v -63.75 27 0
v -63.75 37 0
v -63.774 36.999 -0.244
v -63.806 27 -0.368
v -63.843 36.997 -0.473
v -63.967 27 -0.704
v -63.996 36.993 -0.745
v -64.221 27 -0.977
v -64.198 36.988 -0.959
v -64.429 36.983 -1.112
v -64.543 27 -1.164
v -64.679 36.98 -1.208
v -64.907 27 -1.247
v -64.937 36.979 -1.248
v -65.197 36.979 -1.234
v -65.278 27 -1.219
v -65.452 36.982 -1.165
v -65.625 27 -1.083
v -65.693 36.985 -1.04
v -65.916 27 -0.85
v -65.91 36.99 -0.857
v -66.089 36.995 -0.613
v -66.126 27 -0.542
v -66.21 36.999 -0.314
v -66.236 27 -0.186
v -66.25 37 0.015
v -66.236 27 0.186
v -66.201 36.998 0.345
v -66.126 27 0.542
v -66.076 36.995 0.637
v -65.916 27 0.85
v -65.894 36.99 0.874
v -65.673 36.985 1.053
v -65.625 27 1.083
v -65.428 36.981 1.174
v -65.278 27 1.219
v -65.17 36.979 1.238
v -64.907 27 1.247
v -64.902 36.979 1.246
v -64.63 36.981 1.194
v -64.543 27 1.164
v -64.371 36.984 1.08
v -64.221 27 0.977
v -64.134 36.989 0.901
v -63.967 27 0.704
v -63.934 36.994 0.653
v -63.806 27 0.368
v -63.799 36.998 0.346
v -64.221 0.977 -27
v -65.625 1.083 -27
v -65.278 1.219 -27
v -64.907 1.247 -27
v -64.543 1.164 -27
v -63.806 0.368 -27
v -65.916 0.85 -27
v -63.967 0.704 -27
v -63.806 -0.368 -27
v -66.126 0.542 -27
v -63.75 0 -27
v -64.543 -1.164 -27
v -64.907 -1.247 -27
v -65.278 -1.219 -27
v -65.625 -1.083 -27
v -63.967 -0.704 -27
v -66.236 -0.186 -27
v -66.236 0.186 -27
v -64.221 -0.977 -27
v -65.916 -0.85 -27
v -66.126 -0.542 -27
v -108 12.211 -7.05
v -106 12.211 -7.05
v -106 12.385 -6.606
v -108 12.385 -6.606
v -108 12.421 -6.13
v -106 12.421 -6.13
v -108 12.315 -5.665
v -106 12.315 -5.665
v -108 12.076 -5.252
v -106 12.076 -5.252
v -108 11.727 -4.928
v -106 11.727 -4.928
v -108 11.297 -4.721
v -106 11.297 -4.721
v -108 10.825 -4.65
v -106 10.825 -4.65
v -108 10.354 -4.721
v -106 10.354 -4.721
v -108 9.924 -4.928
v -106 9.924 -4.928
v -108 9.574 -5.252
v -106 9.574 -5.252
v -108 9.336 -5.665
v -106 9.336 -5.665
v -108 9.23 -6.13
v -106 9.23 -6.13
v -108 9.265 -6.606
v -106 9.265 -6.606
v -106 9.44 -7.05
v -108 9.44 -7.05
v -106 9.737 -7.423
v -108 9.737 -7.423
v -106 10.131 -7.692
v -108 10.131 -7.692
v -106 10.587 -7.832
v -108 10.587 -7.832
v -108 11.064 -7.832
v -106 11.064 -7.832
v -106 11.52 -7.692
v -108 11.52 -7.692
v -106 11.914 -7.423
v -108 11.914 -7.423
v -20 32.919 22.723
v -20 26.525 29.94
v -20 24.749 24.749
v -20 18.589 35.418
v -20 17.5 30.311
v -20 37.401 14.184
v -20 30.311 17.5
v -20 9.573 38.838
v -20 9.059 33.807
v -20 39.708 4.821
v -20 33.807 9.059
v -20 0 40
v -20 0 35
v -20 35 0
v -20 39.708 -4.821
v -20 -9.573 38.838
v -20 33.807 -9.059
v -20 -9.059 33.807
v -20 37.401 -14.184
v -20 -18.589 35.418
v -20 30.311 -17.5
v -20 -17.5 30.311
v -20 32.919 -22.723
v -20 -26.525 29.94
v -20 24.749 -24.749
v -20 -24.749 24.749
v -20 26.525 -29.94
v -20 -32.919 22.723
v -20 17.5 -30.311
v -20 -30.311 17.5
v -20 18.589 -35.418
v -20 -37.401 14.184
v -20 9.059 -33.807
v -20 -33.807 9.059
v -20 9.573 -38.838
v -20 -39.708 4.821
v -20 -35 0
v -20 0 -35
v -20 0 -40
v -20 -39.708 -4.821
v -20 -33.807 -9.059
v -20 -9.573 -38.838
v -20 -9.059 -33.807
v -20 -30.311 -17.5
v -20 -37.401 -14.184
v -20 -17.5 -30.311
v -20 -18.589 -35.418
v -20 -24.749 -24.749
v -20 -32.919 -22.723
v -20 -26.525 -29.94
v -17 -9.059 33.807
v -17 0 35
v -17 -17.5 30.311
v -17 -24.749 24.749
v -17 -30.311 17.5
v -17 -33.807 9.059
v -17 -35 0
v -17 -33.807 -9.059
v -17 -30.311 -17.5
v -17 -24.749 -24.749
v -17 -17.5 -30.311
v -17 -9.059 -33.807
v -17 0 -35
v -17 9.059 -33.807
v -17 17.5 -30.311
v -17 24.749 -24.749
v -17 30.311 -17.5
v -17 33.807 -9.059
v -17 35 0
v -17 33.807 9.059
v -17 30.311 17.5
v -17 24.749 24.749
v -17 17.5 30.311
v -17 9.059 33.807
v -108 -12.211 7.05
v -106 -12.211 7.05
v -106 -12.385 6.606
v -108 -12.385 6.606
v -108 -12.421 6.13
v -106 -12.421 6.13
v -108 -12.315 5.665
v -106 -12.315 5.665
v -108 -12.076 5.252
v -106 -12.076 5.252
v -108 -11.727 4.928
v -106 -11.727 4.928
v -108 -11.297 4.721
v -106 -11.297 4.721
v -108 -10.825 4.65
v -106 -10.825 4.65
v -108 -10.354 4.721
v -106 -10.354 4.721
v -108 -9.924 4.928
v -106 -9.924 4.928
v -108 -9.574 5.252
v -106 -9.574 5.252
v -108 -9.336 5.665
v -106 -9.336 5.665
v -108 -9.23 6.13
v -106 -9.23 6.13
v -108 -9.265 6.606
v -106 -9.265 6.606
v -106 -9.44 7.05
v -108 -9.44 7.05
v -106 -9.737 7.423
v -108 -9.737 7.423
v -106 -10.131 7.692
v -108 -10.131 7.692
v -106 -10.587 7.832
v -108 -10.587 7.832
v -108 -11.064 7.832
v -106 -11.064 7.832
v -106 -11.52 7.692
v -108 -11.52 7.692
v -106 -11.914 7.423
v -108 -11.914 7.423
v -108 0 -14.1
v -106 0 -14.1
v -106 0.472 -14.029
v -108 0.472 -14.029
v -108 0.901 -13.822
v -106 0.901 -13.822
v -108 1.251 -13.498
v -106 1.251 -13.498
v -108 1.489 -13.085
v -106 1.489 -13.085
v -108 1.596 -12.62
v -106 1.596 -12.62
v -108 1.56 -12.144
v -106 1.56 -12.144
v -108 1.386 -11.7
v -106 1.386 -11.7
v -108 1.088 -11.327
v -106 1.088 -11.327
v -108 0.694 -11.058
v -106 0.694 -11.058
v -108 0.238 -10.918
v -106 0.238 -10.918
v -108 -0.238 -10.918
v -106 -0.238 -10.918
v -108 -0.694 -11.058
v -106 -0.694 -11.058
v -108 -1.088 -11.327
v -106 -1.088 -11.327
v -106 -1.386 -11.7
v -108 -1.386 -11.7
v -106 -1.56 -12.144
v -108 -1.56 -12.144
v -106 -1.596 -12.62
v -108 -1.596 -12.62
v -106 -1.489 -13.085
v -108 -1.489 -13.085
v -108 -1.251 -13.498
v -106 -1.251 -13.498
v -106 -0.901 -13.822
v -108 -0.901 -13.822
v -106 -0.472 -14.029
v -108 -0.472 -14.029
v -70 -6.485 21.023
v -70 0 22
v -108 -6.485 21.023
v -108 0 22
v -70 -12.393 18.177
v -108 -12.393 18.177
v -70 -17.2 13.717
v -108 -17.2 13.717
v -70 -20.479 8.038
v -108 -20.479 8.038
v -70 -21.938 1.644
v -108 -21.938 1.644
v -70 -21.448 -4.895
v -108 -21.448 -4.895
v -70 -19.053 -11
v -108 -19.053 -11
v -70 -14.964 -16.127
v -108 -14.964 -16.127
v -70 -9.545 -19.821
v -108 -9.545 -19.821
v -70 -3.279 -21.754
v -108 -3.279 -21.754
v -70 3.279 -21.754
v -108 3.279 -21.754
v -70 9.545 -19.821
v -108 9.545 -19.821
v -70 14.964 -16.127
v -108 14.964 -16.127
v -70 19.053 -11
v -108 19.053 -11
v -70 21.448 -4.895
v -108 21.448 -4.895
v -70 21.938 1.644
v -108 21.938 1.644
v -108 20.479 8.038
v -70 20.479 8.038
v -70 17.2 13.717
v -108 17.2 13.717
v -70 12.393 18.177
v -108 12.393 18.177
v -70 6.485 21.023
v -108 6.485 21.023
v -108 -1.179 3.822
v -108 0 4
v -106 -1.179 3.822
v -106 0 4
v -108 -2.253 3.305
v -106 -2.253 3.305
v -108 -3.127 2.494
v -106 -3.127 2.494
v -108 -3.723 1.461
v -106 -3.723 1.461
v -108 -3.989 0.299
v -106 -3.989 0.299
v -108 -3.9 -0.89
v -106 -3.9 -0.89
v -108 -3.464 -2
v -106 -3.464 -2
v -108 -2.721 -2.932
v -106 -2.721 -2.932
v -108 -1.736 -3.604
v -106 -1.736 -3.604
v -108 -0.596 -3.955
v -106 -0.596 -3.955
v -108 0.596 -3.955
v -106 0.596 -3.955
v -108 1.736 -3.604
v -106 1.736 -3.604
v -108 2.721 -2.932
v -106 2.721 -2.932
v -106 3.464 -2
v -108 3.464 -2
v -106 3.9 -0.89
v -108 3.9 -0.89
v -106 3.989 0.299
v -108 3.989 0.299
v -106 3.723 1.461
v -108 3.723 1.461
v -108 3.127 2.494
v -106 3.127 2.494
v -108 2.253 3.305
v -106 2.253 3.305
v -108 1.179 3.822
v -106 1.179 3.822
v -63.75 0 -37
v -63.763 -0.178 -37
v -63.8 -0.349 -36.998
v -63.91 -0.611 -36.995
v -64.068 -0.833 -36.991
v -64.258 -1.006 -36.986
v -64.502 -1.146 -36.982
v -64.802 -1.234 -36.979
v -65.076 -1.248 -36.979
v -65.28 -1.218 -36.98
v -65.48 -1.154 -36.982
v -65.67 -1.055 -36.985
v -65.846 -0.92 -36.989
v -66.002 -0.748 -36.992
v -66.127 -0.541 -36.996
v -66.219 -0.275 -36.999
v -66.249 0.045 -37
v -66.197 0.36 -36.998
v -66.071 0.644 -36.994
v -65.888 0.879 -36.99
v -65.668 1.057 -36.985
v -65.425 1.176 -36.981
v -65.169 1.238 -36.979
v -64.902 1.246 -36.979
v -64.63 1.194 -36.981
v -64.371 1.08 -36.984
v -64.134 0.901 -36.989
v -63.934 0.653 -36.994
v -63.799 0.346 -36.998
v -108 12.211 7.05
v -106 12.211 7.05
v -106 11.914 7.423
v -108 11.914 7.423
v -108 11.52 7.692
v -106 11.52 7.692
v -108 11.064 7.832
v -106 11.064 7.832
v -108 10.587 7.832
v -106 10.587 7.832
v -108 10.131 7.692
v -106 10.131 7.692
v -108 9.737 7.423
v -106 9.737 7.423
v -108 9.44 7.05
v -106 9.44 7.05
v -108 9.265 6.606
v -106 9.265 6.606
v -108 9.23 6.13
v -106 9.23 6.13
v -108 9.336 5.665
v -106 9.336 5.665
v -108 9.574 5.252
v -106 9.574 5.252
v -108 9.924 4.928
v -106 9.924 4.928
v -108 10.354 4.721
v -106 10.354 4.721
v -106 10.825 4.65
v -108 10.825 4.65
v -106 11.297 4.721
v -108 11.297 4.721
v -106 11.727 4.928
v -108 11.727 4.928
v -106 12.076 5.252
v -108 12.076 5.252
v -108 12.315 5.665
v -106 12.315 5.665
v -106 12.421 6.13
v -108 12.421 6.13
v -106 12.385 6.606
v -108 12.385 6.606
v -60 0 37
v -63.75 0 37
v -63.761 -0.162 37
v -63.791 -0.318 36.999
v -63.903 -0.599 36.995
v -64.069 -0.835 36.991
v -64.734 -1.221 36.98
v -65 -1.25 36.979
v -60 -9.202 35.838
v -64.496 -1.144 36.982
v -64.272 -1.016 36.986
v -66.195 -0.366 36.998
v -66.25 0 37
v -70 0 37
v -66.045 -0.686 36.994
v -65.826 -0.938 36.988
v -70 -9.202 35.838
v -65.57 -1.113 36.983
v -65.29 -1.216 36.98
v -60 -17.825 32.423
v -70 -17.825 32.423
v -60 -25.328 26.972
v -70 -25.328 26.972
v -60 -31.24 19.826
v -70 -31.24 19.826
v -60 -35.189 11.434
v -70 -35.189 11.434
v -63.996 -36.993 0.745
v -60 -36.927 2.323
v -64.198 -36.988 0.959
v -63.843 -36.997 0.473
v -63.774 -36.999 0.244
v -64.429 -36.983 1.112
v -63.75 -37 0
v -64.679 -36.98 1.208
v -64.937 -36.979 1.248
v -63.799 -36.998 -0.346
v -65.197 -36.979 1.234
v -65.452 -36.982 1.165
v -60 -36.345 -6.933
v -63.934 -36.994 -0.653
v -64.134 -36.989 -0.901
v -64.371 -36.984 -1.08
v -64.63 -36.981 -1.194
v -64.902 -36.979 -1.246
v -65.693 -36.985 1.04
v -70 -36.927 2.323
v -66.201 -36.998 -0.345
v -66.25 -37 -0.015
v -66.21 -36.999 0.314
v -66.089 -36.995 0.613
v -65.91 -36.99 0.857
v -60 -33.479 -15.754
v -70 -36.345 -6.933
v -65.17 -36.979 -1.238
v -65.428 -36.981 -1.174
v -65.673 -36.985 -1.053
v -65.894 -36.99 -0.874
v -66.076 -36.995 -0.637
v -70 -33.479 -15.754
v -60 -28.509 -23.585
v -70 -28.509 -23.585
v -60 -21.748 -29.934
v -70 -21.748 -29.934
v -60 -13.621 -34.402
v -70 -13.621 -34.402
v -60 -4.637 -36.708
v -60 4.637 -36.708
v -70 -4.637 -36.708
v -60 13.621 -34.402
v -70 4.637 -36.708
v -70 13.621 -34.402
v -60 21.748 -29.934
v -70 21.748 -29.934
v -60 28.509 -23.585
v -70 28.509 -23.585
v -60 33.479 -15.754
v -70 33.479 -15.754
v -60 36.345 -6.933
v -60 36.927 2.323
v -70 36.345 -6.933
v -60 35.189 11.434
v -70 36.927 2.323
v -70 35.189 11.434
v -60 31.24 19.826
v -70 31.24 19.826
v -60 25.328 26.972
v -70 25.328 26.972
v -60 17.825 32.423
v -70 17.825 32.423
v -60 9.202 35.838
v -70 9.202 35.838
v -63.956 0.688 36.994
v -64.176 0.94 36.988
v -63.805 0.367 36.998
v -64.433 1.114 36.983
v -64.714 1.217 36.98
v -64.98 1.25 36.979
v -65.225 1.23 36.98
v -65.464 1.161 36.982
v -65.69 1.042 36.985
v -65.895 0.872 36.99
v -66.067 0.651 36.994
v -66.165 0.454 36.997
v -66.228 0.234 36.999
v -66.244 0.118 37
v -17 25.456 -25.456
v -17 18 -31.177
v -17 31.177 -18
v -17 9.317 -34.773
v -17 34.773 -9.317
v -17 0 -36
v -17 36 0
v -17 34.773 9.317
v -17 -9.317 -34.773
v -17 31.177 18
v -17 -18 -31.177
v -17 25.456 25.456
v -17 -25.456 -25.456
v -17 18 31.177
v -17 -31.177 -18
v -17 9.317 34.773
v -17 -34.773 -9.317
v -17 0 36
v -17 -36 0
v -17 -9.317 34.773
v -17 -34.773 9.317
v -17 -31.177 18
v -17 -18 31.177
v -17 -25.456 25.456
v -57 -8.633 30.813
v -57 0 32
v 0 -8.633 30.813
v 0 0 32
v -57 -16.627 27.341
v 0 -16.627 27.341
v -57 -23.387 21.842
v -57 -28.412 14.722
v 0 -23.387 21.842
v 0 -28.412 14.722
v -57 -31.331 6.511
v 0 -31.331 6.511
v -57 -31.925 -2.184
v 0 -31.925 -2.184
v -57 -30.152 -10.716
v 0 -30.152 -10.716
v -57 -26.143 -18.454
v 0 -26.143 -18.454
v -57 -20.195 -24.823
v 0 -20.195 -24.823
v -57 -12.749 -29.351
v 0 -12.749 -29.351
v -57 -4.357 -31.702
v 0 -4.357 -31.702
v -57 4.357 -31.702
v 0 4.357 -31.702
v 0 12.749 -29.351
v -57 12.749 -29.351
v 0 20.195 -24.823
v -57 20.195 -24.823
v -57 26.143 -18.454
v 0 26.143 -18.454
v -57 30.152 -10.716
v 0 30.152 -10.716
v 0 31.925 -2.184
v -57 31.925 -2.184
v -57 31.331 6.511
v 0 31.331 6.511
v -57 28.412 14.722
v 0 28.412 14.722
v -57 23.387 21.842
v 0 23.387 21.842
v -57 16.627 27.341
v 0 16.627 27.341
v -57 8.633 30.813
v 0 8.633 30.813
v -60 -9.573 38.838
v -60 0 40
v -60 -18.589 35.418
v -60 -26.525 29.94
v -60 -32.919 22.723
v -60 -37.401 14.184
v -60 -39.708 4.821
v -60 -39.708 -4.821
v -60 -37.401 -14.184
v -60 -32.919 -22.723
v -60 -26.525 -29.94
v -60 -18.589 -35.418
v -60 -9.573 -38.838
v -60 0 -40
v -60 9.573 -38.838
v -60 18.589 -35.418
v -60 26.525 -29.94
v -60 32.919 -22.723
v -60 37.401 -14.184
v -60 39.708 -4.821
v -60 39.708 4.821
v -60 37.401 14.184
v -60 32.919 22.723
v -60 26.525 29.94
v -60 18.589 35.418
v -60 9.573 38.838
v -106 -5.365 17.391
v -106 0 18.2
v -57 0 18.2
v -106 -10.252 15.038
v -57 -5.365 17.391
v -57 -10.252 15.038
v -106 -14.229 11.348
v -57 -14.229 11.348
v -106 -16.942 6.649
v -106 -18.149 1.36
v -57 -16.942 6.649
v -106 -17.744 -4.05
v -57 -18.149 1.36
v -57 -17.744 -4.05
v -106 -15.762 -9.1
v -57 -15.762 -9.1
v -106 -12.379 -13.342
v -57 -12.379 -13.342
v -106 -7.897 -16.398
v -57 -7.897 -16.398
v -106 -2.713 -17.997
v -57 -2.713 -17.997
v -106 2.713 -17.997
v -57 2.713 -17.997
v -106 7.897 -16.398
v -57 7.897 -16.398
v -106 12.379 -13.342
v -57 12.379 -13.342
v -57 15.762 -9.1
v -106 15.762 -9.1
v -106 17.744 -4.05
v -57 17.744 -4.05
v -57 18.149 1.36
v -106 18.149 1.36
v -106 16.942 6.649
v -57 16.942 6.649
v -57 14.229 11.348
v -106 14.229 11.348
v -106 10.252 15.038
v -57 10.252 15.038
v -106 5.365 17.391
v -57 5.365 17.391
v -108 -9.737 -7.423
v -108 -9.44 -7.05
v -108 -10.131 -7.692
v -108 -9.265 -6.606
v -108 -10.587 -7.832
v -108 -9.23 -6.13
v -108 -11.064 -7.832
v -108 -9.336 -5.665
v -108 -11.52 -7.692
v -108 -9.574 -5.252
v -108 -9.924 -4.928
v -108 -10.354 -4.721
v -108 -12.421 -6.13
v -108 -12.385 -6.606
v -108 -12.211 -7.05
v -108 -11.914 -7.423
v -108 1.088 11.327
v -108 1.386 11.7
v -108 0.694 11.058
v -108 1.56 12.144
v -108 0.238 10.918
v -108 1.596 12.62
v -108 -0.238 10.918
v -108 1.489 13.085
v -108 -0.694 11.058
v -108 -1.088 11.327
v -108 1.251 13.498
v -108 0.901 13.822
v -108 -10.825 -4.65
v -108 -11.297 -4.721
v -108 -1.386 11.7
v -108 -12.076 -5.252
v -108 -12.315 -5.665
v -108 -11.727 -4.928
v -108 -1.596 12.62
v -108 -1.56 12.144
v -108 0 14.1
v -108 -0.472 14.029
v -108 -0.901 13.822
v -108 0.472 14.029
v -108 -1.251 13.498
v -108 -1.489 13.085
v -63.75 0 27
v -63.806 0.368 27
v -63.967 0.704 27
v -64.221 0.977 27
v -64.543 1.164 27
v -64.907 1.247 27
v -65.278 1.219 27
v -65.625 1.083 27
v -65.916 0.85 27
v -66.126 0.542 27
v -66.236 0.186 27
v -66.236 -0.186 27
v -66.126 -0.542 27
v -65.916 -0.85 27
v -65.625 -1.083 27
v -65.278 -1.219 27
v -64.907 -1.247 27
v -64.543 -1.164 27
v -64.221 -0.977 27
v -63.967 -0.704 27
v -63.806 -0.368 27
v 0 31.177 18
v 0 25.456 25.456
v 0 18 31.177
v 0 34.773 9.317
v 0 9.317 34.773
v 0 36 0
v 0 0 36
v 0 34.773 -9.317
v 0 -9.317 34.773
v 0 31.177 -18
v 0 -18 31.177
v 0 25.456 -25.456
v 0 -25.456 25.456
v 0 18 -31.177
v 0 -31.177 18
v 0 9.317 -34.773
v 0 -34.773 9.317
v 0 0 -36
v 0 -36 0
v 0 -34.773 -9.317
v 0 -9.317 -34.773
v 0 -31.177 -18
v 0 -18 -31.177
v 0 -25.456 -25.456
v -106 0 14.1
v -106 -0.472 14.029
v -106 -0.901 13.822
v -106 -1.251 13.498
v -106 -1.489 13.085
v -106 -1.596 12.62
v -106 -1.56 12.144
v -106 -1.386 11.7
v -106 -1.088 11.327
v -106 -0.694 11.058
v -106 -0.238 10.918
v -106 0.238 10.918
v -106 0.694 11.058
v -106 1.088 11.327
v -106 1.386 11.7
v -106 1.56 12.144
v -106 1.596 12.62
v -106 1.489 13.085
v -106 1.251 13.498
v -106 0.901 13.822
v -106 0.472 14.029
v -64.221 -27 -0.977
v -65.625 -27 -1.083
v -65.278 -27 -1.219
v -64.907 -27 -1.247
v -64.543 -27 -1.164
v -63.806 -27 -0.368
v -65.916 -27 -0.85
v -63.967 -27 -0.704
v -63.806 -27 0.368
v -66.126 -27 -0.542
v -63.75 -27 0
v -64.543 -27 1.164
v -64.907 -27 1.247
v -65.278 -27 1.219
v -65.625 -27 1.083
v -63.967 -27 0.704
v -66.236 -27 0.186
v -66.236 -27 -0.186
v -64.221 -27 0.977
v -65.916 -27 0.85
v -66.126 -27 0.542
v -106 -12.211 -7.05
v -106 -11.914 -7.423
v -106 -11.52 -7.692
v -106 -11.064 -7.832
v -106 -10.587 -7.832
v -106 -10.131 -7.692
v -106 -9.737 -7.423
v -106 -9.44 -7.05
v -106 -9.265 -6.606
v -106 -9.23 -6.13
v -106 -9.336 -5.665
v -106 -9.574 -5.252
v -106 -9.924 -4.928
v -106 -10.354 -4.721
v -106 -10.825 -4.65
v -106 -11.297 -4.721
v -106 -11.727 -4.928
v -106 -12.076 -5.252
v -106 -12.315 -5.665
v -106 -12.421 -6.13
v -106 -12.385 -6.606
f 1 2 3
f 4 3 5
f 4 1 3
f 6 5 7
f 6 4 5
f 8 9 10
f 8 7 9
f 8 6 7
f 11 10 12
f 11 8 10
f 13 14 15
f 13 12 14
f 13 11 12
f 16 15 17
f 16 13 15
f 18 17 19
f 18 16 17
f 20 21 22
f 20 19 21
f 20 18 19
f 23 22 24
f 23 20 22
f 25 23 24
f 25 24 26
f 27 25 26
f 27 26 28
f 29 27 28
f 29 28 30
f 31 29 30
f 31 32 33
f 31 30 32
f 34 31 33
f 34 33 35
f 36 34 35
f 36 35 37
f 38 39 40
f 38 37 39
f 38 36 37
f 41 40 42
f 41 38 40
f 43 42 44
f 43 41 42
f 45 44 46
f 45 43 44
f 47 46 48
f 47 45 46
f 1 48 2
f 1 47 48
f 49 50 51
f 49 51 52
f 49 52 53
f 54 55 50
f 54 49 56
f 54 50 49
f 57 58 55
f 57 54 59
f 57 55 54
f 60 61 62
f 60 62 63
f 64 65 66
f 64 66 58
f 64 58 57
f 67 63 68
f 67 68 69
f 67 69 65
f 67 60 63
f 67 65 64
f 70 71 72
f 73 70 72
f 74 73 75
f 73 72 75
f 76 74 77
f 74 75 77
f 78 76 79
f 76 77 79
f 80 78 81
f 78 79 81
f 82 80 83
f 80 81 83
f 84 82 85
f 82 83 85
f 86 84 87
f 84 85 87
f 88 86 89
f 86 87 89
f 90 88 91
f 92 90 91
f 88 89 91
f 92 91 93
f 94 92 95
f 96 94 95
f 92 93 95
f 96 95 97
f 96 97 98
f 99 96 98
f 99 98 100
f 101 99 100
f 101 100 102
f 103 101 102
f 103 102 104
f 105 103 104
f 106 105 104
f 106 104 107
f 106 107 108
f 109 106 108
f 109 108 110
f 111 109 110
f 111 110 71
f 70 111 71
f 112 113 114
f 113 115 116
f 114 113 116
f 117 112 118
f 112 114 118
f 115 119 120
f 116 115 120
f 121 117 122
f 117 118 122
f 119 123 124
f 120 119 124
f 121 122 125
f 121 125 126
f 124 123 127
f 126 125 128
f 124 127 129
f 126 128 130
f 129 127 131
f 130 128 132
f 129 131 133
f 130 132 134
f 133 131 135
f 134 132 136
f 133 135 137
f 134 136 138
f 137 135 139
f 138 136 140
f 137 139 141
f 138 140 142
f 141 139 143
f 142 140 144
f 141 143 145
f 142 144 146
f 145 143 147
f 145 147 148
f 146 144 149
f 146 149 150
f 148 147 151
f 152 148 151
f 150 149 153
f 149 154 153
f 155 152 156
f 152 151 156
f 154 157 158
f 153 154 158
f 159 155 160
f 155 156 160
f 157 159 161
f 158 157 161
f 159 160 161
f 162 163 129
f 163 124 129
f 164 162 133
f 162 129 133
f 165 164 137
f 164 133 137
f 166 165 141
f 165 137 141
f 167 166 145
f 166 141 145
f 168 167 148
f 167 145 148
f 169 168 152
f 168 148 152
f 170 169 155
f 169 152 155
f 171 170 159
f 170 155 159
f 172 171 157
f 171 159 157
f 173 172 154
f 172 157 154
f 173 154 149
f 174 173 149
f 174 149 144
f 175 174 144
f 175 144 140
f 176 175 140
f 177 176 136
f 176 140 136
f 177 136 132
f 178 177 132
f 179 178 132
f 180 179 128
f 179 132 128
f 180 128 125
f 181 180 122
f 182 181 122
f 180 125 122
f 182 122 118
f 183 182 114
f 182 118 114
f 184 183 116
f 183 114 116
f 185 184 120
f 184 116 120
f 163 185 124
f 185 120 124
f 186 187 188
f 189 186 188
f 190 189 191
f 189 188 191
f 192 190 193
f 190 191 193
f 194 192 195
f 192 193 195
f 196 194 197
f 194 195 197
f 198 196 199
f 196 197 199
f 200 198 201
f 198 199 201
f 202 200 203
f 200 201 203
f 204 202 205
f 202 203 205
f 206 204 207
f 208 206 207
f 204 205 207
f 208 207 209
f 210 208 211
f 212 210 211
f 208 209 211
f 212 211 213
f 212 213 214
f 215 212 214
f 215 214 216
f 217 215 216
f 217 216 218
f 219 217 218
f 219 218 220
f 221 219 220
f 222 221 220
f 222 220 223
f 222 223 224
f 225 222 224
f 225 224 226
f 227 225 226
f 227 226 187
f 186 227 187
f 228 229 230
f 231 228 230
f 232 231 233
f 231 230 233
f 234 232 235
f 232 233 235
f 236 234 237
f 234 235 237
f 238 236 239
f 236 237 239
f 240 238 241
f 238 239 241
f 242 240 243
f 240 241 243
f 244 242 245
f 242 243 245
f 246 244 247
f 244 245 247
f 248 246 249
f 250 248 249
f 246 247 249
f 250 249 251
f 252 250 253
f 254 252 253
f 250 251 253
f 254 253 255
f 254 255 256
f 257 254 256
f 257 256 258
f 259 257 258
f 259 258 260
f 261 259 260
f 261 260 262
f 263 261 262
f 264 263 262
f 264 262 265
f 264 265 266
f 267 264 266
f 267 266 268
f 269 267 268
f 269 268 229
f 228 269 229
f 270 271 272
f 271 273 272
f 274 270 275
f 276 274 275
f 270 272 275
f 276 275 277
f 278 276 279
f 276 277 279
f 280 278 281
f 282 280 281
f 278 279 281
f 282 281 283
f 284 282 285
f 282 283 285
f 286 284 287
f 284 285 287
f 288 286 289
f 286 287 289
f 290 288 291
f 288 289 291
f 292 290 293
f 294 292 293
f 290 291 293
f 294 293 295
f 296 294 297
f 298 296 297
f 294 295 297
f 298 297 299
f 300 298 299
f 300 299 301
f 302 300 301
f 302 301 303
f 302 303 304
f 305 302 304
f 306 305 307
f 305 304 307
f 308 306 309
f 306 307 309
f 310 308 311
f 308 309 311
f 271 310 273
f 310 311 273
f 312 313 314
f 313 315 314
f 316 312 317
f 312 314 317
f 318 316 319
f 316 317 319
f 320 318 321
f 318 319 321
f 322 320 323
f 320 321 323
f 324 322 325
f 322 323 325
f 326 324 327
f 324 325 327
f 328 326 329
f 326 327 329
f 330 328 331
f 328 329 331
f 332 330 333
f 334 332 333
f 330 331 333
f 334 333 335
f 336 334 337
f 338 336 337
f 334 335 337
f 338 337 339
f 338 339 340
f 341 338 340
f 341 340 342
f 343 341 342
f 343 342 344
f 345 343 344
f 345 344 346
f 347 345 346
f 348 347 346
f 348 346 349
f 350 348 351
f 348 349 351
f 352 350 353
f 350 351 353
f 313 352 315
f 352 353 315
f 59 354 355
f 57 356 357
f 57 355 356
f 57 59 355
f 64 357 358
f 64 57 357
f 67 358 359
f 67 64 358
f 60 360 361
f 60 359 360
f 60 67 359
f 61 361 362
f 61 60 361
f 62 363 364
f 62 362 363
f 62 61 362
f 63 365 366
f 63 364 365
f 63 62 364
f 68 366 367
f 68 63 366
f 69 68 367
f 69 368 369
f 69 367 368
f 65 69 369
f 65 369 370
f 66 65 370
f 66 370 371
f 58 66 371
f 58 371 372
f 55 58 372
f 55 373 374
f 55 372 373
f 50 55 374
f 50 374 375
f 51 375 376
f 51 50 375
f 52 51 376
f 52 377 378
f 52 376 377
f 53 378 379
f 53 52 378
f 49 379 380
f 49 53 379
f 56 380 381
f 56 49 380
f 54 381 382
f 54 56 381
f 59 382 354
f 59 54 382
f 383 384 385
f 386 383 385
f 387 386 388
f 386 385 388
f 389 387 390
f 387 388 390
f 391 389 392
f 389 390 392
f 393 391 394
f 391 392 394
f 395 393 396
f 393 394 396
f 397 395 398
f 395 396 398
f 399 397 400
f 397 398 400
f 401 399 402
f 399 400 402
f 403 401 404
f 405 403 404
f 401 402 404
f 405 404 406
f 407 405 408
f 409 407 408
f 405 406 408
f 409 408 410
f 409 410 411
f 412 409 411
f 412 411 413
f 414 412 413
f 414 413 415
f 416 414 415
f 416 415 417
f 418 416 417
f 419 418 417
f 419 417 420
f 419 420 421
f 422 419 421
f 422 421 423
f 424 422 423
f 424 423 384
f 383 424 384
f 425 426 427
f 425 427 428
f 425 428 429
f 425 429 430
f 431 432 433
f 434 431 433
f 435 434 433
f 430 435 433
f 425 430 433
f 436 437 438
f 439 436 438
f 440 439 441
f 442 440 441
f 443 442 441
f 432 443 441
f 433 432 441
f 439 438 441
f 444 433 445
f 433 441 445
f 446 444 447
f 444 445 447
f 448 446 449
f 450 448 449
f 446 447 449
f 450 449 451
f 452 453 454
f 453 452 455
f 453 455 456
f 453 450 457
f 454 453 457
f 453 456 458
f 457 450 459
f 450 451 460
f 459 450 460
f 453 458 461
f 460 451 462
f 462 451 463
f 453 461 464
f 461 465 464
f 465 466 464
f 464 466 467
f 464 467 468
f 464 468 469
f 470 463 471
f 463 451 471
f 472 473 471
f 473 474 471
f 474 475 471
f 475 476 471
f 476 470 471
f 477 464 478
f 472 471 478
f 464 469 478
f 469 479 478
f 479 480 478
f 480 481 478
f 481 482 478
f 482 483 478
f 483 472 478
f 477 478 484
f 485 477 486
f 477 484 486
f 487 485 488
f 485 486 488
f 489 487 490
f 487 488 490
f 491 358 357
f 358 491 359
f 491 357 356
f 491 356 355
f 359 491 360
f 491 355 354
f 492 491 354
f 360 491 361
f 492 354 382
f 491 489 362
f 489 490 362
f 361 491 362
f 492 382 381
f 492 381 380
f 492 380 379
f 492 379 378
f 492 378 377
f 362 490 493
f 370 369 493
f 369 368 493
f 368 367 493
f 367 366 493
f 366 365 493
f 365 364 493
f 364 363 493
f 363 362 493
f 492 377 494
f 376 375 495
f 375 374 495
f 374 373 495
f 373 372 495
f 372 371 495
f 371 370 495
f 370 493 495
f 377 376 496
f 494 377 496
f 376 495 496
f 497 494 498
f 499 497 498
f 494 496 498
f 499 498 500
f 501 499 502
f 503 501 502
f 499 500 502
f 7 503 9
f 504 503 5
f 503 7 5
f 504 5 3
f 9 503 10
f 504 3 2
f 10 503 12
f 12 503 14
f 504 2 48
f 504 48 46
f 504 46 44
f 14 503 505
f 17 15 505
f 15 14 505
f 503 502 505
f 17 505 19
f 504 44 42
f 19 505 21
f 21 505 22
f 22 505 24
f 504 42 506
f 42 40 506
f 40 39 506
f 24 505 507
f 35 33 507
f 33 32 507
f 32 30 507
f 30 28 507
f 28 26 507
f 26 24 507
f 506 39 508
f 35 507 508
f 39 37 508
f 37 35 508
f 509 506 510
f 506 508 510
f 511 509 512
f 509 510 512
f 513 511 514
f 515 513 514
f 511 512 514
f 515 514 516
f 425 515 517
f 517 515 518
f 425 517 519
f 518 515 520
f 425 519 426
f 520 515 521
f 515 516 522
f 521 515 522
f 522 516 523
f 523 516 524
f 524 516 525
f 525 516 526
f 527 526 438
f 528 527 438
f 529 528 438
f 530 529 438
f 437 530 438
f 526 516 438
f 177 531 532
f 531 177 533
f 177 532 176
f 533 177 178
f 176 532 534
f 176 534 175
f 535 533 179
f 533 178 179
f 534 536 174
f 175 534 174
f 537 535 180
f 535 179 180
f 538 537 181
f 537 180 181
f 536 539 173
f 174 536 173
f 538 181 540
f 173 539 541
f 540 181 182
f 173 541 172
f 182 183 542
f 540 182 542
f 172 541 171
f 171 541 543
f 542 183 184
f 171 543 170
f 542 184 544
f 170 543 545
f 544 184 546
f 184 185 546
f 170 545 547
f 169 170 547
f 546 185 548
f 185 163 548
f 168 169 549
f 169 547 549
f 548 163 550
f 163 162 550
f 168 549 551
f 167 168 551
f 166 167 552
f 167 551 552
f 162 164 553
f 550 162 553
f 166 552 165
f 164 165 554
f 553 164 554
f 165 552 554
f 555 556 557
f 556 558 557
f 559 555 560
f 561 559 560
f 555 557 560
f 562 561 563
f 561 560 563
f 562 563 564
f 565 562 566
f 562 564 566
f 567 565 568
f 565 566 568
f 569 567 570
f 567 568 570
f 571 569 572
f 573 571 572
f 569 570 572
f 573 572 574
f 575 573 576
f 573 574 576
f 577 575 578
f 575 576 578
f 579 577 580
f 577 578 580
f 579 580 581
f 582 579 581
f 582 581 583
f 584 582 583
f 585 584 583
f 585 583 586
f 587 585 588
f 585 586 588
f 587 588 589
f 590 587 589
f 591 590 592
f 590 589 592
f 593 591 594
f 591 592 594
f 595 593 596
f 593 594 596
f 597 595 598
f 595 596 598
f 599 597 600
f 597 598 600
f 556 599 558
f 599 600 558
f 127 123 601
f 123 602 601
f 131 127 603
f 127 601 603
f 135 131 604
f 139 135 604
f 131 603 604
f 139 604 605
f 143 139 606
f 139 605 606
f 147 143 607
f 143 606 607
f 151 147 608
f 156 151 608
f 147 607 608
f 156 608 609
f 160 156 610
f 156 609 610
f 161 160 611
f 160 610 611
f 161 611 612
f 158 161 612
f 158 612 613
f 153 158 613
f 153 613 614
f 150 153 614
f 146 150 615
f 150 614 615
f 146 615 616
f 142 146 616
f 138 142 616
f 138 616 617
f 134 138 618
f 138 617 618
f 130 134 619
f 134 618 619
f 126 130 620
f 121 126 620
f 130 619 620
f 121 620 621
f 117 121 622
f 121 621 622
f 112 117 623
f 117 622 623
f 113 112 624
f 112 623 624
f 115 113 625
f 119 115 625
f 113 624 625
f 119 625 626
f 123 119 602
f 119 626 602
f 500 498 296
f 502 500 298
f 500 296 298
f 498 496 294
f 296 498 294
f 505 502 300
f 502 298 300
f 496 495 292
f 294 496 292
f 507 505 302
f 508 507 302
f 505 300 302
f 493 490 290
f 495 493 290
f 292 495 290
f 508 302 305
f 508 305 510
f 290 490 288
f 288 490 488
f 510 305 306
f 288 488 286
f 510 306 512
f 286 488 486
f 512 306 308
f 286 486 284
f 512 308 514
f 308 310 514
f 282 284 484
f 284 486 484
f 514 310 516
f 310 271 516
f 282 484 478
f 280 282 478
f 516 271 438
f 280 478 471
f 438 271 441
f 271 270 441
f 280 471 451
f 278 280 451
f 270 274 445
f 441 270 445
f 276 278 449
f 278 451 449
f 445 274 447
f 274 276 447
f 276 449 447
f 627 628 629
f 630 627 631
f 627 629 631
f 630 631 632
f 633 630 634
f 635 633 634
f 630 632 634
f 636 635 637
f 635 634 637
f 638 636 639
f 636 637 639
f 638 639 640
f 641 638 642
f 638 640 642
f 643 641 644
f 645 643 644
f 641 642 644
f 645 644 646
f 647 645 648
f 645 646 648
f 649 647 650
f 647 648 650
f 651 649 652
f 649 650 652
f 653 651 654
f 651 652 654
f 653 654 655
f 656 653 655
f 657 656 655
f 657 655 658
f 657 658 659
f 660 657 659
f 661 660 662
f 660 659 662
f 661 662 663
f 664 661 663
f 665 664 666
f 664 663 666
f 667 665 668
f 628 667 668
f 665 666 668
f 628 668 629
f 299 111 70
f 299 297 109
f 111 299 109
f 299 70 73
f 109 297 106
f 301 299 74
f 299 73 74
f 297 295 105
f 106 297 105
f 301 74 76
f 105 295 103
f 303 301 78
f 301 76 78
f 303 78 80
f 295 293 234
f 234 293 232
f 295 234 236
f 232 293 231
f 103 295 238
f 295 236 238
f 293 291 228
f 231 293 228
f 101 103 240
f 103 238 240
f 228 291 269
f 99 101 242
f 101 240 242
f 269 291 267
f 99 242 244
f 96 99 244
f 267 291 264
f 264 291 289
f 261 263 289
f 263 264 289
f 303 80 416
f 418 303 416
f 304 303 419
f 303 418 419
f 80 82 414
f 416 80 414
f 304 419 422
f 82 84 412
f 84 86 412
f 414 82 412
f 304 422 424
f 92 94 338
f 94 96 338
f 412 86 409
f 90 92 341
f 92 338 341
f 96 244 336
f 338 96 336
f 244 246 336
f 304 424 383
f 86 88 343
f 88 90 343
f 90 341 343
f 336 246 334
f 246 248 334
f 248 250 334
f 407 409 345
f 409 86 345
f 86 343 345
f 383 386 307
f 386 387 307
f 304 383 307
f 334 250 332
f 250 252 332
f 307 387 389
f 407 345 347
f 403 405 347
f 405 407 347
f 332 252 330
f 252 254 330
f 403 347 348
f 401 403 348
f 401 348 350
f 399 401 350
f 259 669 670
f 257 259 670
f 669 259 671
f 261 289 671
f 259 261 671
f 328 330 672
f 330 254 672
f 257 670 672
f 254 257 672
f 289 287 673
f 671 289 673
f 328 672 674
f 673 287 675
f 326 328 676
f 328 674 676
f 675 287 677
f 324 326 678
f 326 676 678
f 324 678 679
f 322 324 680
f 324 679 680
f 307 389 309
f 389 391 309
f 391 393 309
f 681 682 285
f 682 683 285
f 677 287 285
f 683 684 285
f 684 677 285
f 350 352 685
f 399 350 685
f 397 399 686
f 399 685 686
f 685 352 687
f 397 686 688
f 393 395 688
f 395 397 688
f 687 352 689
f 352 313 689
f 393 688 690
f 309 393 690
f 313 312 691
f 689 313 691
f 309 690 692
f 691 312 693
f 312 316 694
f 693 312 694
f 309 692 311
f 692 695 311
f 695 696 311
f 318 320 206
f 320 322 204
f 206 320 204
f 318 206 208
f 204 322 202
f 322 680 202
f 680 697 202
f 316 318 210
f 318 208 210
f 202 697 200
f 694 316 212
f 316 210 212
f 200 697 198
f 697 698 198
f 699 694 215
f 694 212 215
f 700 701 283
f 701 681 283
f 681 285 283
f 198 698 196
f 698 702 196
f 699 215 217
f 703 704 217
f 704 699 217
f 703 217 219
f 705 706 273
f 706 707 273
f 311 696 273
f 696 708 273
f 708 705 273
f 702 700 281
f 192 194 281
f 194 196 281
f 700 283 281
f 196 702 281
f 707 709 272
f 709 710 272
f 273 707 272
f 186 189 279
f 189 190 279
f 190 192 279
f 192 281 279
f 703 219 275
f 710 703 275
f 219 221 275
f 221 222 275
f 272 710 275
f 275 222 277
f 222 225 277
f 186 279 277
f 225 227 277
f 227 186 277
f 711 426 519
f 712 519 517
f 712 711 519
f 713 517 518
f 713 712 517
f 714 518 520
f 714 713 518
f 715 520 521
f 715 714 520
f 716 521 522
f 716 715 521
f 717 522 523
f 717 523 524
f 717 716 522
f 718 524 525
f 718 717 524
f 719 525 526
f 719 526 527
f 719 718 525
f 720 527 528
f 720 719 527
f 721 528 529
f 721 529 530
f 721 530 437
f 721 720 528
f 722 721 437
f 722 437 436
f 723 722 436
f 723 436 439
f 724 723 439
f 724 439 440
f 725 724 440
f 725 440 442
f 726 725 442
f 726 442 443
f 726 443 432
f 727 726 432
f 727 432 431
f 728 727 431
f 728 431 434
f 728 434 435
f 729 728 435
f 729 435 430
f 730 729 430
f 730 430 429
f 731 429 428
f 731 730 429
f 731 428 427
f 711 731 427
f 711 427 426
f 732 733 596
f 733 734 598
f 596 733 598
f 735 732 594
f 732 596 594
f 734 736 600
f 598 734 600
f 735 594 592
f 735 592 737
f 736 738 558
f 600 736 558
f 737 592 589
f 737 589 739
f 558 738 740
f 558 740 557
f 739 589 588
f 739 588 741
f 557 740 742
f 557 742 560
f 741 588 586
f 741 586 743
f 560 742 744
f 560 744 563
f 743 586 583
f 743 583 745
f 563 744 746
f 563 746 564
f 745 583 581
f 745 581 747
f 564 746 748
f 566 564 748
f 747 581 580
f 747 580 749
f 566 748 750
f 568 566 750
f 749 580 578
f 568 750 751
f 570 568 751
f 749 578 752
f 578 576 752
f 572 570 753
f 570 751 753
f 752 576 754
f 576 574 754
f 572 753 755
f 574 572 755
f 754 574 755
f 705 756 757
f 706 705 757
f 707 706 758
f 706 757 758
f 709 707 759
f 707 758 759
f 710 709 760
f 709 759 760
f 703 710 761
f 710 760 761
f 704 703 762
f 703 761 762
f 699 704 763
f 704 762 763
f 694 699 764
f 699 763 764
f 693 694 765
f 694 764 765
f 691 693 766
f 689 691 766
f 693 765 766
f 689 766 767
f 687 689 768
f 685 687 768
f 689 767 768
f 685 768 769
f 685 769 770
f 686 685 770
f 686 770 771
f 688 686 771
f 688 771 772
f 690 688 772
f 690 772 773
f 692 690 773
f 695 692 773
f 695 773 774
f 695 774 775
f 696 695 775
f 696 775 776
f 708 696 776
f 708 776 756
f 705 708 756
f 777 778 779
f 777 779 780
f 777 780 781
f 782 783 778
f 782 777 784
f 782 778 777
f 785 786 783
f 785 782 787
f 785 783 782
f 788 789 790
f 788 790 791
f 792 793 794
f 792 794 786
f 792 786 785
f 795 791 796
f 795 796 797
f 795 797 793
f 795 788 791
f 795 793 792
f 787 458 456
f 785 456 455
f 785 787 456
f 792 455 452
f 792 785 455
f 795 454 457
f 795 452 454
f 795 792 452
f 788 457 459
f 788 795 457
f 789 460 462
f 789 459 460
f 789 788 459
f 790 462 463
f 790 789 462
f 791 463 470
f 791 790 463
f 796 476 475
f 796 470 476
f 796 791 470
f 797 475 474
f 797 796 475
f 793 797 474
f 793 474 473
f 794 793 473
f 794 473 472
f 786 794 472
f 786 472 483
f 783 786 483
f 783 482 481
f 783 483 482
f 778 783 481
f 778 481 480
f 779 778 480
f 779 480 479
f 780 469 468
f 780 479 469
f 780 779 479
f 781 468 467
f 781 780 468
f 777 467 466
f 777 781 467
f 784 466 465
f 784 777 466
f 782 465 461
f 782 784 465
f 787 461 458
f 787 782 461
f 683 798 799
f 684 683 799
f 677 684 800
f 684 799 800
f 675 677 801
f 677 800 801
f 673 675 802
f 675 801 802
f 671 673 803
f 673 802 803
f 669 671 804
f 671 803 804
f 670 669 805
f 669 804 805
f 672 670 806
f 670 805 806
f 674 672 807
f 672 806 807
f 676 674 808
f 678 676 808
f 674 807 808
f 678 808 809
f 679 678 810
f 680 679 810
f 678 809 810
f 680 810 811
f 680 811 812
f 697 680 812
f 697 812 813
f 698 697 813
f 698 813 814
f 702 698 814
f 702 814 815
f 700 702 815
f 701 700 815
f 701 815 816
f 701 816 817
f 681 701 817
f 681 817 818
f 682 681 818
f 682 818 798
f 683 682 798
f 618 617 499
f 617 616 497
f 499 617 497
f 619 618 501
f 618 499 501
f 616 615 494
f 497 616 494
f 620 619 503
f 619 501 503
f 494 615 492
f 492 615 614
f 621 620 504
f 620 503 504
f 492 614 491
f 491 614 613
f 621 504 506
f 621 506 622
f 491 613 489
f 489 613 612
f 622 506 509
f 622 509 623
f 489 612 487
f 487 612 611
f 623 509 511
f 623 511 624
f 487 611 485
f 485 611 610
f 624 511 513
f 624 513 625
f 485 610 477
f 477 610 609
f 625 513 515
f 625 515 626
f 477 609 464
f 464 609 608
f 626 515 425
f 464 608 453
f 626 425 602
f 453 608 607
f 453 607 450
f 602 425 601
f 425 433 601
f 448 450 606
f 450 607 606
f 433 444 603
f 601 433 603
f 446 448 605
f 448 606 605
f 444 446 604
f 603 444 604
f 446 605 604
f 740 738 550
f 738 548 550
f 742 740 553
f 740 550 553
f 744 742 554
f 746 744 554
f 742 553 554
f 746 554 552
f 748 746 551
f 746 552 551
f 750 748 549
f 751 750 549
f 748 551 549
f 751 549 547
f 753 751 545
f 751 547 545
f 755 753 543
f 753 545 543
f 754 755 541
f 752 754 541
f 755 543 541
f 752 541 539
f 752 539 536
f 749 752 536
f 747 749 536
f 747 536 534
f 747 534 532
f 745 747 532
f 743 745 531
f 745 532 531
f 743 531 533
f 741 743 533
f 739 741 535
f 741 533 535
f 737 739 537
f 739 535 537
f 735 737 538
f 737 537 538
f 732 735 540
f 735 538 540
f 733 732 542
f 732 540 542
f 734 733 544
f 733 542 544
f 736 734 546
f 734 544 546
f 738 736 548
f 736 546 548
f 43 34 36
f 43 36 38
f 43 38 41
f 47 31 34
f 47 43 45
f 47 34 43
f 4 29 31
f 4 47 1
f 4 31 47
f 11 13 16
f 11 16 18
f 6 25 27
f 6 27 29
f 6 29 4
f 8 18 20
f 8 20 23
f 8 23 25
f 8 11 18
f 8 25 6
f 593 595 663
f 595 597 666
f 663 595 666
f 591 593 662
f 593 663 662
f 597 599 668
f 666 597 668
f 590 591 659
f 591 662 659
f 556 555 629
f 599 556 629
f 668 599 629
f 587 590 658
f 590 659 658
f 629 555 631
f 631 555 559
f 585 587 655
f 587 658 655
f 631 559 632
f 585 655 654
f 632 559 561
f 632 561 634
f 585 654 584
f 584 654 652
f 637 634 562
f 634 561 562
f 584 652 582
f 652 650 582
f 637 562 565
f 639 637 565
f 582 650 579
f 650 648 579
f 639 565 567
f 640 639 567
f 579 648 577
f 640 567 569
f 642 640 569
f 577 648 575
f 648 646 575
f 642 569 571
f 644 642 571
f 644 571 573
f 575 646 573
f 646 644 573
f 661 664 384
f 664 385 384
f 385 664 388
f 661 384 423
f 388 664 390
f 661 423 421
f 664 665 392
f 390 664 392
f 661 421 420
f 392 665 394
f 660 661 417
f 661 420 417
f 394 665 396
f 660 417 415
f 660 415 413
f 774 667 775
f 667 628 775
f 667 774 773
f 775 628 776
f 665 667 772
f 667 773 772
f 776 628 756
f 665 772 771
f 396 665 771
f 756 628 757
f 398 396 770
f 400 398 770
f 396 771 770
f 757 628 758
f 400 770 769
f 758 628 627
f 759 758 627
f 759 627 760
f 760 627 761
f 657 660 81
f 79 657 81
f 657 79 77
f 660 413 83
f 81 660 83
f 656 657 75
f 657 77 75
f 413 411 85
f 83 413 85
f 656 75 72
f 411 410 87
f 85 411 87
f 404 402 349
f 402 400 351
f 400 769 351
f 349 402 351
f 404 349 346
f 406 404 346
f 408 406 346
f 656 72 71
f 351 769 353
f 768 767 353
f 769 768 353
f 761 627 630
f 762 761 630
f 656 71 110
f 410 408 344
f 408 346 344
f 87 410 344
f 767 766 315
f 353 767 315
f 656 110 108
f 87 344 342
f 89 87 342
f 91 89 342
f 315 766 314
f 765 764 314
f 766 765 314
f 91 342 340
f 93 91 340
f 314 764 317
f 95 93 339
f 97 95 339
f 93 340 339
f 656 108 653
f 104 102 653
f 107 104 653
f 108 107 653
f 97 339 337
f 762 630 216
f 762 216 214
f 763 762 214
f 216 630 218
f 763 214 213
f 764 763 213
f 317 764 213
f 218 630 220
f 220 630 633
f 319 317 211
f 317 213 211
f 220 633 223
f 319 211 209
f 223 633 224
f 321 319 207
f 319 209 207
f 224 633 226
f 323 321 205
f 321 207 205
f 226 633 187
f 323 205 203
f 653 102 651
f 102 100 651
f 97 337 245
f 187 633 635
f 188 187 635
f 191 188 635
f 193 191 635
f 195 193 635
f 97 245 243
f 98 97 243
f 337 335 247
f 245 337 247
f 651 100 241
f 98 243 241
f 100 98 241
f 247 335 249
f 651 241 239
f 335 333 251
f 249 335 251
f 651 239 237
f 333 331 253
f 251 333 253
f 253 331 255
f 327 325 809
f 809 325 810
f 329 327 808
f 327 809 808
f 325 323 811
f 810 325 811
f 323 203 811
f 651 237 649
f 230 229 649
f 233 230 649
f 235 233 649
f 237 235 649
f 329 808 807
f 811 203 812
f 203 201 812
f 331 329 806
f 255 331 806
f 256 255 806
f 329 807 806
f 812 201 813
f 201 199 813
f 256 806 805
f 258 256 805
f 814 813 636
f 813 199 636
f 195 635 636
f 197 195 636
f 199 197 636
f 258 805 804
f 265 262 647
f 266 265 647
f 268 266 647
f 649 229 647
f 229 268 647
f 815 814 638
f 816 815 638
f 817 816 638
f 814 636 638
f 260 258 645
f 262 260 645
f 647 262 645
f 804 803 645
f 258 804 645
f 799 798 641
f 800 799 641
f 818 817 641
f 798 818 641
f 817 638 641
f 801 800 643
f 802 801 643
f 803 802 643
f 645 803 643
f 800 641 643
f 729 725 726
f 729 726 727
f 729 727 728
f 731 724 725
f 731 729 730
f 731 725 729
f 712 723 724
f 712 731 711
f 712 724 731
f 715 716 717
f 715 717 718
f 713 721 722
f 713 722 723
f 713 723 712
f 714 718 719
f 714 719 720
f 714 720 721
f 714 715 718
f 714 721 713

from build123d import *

# Parameters (mm, degrees)
IZIM12_R                = 1.6
KES_EKSTR_ZYON1_DEPTH   = 122.918005233
DAIRESEL_KAPLAMA1_COUNT = 6
KES_EKSTR_ZYON2_START   = 27
IZIM13_R                = 1.25
KES_EKSTR_ZYON2_DEPTH   = 10
DAIRESEL_KAPLAMA2_COUNT = 4


with BuildPart() as part:
    # Çizim1 → Döndür1 (revolve)
    with BuildSketch(Plane.XY, mode=Mode.PRIVATE) as d_nd_r1_sk:
        Polygon((-60, 40), (-60, 37), (-70, 37), (-70, 22), (-108, 22), (-108, 4), (-106, 4), (-106, 18.2), (-57, 18.2), (-57, 32), (0, 32), (0, 36), (-17, 36), (-17, 35), (-20, 35), (-20, 40), align=None)
    revolve(d_nd_r1_sk.sketch.rotate(Axis((-88.99, 0, 0), (1, 0, 0)), 90), axis=Axis((-88.99, 0, 0), (1, 0, 0)))

    # Çizim12 → Kes-Ekstrüzyon1 (cut, through all)
    with BuildSketch(Plane(origin=(0, 0, 0), x_dir=(0, 0, -1), z_dir=(1, 0, 0))):
        with Locations((12.5, 0)):
            Circle(IZIM12_R)
    kes_ekstr_zyon1 = extrude(amount=-KES_EKSTR_ZYON1_DEPTH, mode=Mode.SUBTRACT)

    # Dairesel Kaplama1: Kes-Ekstrüzyon1 ×6 about axis
    dairesel_kaplama1_axis = Axis((0, 0, 0), (1, 0, 0))
    for i in range(1, DAIRESEL_KAPLAMA1_COUNT):
        add(kes_ekstr_zyon1.rotate(dairesel_kaplama1_axis, i * 360 / DAIRESEL_KAPLAMA1_COUNT), mode=Mode.SUBTRACT)

    # Çizim13 → Kes-Ekstrüzyon2 (cut)
    with BuildSketch(Plane.XY.offset(KES_EKSTR_ZYON2_START)):
        with Locations((-65, 0)):
            Circle(IZIM13_R)
    kes_ekstr_zyon2 = extrude(amount=KES_EKSTR_ZYON2_DEPTH, mode=Mode.SUBTRACT)

    # Dairesel Kaplama2: Kes-Ekstrüzyon2 ×4 about axis
    dairesel_kaplama2_axis = Axis((0, 0, 0), (1, 0, 0))
    for i in range(1, DAIRESEL_KAPLAMA2_COUNT):
        add(kes_ekstr_zyon2.rotate(dairesel_kaplama2_axis, i * 360 / DAIRESEL_KAPLAMA2_COUNT), mode=Mode.SUBTRACT)


solid = part.part
